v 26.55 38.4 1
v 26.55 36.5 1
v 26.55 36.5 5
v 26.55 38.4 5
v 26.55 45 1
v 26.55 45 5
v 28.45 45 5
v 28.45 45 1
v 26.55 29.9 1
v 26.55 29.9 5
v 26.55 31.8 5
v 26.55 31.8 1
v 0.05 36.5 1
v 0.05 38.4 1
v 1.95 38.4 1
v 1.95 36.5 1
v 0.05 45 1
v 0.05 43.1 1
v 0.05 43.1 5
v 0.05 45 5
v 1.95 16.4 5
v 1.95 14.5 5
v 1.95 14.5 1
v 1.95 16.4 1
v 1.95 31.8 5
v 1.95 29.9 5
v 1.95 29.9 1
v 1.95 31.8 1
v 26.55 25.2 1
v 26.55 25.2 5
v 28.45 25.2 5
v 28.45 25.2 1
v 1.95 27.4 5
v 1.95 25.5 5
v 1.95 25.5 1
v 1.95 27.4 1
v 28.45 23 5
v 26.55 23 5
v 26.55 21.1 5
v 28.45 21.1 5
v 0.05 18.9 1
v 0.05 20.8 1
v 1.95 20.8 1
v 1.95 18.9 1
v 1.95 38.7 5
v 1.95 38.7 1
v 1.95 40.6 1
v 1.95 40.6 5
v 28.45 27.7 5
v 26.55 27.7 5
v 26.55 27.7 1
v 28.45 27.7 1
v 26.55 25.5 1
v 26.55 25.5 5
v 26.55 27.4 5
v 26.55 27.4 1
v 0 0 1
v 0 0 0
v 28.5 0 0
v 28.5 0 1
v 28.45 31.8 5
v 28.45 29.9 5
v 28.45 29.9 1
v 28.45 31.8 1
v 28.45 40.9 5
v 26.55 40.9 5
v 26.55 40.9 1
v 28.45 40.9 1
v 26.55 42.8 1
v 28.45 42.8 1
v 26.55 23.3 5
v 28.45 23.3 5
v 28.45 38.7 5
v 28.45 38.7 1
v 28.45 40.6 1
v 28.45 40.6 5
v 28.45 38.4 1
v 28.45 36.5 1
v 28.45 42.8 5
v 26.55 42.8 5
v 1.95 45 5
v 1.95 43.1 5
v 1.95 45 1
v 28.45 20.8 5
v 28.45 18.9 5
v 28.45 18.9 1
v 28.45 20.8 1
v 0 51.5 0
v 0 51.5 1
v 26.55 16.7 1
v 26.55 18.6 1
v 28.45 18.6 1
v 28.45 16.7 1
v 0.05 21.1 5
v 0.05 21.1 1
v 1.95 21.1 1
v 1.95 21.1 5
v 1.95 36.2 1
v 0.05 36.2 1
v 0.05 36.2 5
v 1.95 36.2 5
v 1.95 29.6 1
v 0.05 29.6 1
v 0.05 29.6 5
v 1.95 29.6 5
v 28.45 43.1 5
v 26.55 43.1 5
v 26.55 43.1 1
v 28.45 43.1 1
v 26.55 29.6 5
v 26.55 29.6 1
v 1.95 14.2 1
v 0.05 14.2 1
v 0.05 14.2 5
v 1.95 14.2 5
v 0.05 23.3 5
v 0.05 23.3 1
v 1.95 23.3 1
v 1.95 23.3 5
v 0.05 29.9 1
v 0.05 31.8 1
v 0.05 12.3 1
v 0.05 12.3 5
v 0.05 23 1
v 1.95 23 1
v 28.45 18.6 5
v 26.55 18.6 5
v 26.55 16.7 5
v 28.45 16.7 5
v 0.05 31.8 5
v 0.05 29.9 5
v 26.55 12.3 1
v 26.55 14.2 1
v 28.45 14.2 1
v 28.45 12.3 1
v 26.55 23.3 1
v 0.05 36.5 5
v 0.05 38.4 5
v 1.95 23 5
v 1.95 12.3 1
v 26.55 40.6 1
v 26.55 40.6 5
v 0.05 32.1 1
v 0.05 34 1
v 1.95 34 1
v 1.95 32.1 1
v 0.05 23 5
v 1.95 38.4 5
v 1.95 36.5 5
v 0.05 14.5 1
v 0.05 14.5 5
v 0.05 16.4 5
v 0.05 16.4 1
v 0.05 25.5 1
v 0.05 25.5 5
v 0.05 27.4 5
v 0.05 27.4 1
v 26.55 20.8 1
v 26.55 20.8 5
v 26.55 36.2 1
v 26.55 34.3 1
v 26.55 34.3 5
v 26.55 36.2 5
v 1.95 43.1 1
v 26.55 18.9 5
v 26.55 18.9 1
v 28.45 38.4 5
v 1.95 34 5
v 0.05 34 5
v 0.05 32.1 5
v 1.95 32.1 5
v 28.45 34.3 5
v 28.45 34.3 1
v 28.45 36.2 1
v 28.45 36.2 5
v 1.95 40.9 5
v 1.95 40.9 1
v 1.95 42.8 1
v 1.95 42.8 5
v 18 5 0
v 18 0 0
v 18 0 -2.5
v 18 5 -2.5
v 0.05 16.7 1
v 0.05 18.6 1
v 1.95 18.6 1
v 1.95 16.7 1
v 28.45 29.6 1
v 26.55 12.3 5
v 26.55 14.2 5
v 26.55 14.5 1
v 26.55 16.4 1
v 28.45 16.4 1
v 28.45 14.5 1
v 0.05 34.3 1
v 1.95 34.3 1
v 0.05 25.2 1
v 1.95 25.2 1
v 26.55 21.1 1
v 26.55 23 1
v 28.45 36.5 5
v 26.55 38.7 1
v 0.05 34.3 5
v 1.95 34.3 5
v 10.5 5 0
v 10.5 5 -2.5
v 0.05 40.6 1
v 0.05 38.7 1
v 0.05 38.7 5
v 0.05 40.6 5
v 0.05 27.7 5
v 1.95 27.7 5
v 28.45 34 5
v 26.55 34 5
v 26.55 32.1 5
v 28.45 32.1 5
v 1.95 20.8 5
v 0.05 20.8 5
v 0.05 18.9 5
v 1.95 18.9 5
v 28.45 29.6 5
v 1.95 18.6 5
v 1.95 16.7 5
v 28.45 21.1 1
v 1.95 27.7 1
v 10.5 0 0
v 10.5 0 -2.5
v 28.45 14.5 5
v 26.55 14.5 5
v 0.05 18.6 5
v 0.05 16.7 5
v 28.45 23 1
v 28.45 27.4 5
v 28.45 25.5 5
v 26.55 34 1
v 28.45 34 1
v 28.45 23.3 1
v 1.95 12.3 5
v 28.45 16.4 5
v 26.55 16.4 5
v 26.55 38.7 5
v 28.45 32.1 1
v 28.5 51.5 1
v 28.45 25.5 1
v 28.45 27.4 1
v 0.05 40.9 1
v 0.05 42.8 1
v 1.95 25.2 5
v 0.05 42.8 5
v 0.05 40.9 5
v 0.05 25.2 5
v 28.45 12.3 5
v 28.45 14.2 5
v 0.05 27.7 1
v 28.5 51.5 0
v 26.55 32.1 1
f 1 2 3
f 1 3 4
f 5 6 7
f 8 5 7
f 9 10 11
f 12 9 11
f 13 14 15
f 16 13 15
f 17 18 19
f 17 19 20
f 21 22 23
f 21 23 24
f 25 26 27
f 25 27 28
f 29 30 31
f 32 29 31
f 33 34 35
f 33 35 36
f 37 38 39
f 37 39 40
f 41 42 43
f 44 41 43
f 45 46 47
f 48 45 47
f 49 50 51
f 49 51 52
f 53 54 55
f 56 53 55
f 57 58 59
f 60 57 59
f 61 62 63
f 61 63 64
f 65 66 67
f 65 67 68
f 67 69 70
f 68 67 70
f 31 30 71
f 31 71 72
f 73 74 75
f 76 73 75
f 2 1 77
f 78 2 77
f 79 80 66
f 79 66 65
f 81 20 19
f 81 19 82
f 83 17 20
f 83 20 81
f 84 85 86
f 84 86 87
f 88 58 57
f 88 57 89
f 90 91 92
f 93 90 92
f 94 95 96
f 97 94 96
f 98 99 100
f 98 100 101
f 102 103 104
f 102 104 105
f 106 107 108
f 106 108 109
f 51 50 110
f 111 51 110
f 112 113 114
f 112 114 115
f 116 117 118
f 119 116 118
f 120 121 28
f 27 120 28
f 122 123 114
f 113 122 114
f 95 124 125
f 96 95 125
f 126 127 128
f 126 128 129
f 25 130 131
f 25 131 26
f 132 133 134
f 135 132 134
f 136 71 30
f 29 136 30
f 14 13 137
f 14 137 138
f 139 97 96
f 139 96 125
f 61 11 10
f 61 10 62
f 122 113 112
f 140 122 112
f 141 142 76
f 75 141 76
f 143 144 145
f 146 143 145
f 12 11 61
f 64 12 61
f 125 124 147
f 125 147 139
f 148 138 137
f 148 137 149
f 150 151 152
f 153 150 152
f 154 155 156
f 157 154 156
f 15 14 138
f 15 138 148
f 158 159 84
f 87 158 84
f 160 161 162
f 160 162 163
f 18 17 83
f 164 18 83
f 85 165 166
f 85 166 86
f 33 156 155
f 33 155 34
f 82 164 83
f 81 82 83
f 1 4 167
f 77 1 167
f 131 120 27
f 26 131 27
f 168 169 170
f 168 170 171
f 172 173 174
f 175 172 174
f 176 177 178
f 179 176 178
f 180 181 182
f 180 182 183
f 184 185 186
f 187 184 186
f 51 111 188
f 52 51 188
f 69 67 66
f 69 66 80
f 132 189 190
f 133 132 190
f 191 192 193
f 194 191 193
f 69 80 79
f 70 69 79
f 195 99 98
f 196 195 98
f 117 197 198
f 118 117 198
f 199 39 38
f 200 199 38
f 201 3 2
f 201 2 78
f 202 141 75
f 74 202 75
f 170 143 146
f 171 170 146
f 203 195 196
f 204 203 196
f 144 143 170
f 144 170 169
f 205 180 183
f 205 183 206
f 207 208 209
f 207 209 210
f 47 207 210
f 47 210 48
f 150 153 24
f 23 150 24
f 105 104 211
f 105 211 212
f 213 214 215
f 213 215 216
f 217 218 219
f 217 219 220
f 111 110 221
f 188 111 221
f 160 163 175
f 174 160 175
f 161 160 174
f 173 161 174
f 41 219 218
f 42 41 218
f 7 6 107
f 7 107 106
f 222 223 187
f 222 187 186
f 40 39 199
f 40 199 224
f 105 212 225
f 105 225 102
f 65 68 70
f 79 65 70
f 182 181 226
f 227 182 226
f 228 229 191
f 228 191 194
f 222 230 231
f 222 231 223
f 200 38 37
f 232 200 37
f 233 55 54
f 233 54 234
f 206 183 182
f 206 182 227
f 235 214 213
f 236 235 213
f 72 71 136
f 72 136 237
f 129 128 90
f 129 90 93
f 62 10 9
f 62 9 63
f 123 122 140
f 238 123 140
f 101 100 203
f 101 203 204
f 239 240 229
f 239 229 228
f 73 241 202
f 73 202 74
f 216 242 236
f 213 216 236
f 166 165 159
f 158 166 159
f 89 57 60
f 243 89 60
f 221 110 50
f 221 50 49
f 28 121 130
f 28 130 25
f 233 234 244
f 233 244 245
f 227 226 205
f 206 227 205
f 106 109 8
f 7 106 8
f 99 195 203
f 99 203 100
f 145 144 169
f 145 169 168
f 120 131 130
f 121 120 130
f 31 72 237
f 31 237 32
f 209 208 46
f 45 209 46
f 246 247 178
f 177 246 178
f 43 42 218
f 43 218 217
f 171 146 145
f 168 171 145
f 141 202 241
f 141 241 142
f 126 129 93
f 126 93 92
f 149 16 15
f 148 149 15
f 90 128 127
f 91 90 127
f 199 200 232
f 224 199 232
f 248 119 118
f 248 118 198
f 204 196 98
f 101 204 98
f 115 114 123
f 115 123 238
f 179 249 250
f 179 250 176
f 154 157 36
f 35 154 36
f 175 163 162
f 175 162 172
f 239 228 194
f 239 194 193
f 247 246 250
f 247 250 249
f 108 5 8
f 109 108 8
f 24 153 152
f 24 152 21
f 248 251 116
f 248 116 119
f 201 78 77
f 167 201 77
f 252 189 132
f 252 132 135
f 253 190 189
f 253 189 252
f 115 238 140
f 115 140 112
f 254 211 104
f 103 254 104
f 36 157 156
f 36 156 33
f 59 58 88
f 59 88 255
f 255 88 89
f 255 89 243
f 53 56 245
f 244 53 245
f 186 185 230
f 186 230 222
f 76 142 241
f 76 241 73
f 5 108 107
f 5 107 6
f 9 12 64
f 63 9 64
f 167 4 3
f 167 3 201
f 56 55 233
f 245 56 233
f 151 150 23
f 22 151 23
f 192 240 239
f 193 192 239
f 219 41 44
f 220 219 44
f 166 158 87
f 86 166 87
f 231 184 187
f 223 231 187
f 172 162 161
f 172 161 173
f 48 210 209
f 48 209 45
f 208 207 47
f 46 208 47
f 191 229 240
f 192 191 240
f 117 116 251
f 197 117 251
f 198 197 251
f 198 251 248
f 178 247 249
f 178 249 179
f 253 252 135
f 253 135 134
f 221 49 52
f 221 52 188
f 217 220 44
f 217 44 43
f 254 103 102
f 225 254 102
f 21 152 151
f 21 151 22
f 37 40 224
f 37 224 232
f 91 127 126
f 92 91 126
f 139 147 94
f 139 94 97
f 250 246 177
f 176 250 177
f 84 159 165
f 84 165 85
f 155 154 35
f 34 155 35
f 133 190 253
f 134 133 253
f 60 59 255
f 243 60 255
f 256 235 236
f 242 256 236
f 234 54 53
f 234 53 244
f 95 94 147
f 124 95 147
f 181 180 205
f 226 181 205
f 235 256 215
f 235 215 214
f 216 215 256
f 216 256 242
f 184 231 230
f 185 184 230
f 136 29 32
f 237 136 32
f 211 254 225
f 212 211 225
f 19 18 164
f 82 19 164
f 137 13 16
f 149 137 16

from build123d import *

# Parameters (mm, degrees)
SKETCH_1_W         = 28.5
SKETCH_1_H         = 51.5
EXTRUDE_1_DEPTH    = 1
SKETCH_2_W         = 1.9
SKETCH_2_H         = 1.9
EXTRUDE_2_DEPTH    = 4
EXTRUDE_2_2_DEPTH  = 4
EXTRUDE_2_3_DEPTH  = 4
EXTRUDE_2_4_DEPTH  = 4
EXTRUDE_2_5_DEPTH  = 4
EXTRUDE_2_6_DEPTH  = 4
EXTRUDE_2_7_DEPTH  = 4
EXTRUDE_2_8_DEPTH  = 4
EXTRUDE_2_9_DEPTH  = 4
EXTRUDE_2_10_DEPTH = 4
EXTRUDE_2_11_DEPTH = 4
EXTRUDE_2_12_DEPTH = 4
EXTRUDE_2_13_DEPTH = 4
EXTRUDE_2_14_DEPTH = 4
EXTRUDE_2_15_DEPTH = 4
EXTRUDE_2_16_DEPTH = 4
EXTRUDE_2_17_DEPTH = 4
EXTRUDE_2_18_DEPTH = 4
EXTRUDE_2_19_DEPTH = 4
EXTRUDE_2_20_DEPTH = 4
EXTRUDE_2_21_DEPTH = 4
EXTRUDE_2_22_DEPTH = 4
EXTRUDE_2_23_DEPTH = 4
EXTRUDE_2_24_DEPTH = 4
EXTRUDE_2_25_DEPTH = 4
EXTRUDE_2_26_DEPTH = 4
EXTRUDE_2_27_DEPTH = 4
EXTRUDE_2_28_DEPTH = 4
EXTRUDE_2_29_DEPTH = 4
EXTRUDE_2_30_DEPTH = 4
SKETCH_3_W         = 7.5
SKETCH_3_H         = 5
EXTRUDE_3_DEPTH    = 2.5


with BuildPart() as part:
    # ｽｹｯﾁ1 → ﾎﾞｽ - 押し出し1 (new body)
    with BuildSketch(Plane.XY):
        with Locations((14.25, 25.75)):
            Rectangle(SKETCH_1_W, SKETCH_1_H)
    extrude(amount=EXTRUDE_1_DEPTH)


with BuildPart() as body_2:
    # ｽｹｯﾁ2 → ﾎﾞｽ - 押し出し2 (new body)
    with BuildSketch(Plane.XY.offset(1)):
        with Locations((1, 44.05)):
            Rectangle(SKETCH_2_W, SKETCH_2_H)
    extrude(amount=EXTRUDE_2_DEPTH)


with BuildPart() as body_3:
    # ｽｹｯﾁ2 → Extrude 2 2 (new body)
    with BuildSketch(Plane.XY.offset(1)):
        with Locations((27.5, 44.05)):
            Rectangle(SKETCH_2_W, SKETCH_2_H)
    extrude(amount=EXTRUDE_2_2_DEPTH)


with BuildPart() as body_4:
    # ｽｹｯﾁ2 → Extrude 2 3 (new body)
    with BuildSketch(Plane.XY.offset(1)):
        with Locations((1, 41.85)):
            Rectangle(SKETCH_2_W, SKETCH_2_H)
    extrude(amount=EXTRUDE_2_3_DEPTH)


with BuildPart() as body_5:
    # ｽｹｯﾁ2 → Extrude 2 4 (new body)
    with BuildSketch(Plane.XY.offset(1)):
        with Locations((27.5, 41.85)):
            Rectangle(SKETCH_2_W, SKETCH_2_H)
    extrude(amount=EXTRUDE_2_4_DEPTH)


with BuildPart() as body_6:
    # ｽｹｯﾁ2 → Extrude 2 5 (new body)
    with BuildSketch(Plane.XY.offset(1)):
        with Locations((1, 39.65)):
            Rectangle(SKETCH_2_W, SKETCH_2_H)
    extrude(amount=EXTRUDE_2_5_DEPTH)


with BuildPart() as body_7:
    # ｽｹｯﾁ2 → Extrude 2 6 (new body)
    with BuildSketch(Plane.XY.offset(1)):
        with Locations((27.5, 39.65)):
            Rectangle(SKETCH_2_W, SKETCH_2_H)
    extrude(amount=EXTRUDE_2_6_DEPTH)


with BuildPart() as body_8:
    # ｽｹｯﾁ2 → Extrude 2 7 (new body)
    with BuildSketch(Plane.XY.offset(1)):
        with Locations((1, 37.45)):
            Rectangle(SKETCH_2_W, SKETCH_2_H)
    extrude(amount=EXTRUDE_2_7_DEPTH)


with BuildPart() as body_9:
    # ｽｹｯﾁ2 → Extrude 2 8 (new body)
    with BuildSketch(Plane.XY.offset(1)):
        with Locations((27.5, 37.45)):
            Rectangle(SKETCH_2_W, SKETCH_2_H)
    extrude(amount=EXTRUDE_2_8_DEPTH)


with BuildPart() as body_10:
    # ｽｹｯﾁ2 → Extrude 2 9 (new body)
    with BuildSketch(Plane.XY.offset(1)):
        with Locations((1, 35.25)):
            Rectangle(SKETCH_2_W, SKETCH_2_H)
    extrude(amount=EXTRUDE_2_9_DEPTH)


with BuildPart() as body_11:
    # ｽｹｯﾁ2 → Extrude 2 10 (new body)
    with BuildSketch(Plane.XY.offset(1)):
        with Locations((27.5, 35.25)):
            Rectangle(SKETCH_2_W, SKETCH_2_H)
    extrude(amount=EXTRUDE_2_10_DEPTH)


with BuildPart() as body_12:
    # ｽｹｯﾁ2 → Extrude 2 11 (new body)
    with BuildSketch(Plane.XY.offset(1)):
        with Locations((1, 33.05)):
            Rectangle(SKETCH_2_W, SKETCH_2_H)
    extrude(amount=EXTRUDE_2_11_DEPTH)


with BuildPart() as body_13:
    # ｽｹｯﾁ2 → Extrude 2 12 (new body)
    with BuildSketch(Plane.XY.offset(1)):
        with Locations((27.5, 33.05)):
            Rectangle(SKETCH_2_W, SKETCH_2_H)
    extrude(amount=EXTRUDE_2_12_DEPTH)


with BuildPart() as body_14:
    # ｽｹｯﾁ2 → Extrude 2 13 (new body)
    with BuildSketch(Plane.XY.offset(1)):
        with Locations((1, 30.85)):
            Rectangle(SKETCH_2_W, SKETCH_2_H)
    extrude(amount=EXTRUDE_2_13_DEPTH)


with BuildPart() as body_15:
    # ｽｹｯﾁ2 → Extrude 2 14 (new body)
    with BuildSketch(Plane.XY.offset(1)):
        with Locations((27.5, 30.85)):
            Rectangle(SKETCH_2_W, SKETCH_2_H)
    extrude(amount=EXTRUDE_2_14_DEPTH)


with BuildPart() as body_16:
    # ｽｹｯﾁ2 → Extrude 2 15 (new body)
    with BuildSketch(Plane.XY.offset(1)):
        with Locations((1, 28.65)):
            Rectangle(SKETCH_2_W, SKETCH_2_H)
    extrude(amount=EXTRUDE_2_15_DEPTH)


with BuildPart() as body_17:
    # ｽｹｯﾁ2 → Extrude 2 16 (new body)
    with BuildSketch(Plane.XY.offset(1)):
        with Locations((27.5, 28.65)):
            Rectangle(SKETCH_2_W, SKETCH_2_H)
    extrude(amount=EXTRUDE_2_16_DEPTH)


with BuildPart() as body_18:
    # ｽｹｯﾁ2 → Extrude 2 17 (new body)
    with BuildSketch(Plane.XY.offset(1)):
        with Locations((1, 26.45)):
            Rectangle(SKETCH_2_W, SKETCH_2_H)
    extrude(amount=EXTRUDE_2_17_DEPTH)


with BuildPart() as body_19:
    # ｽｹｯﾁ2 → Extrude 2 18 (new body)
    with BuildSketch(Plane.XY.offset(1)):
        with Locations((27.5, 26.45)):
            Rectangle(SKETCH_2_W, SKETCH_2_H)
    extrude(amount=EXTRUDE_2_18_DEPTH)


with BuildPart() as body_20:
    # ｽｹｯﾁ2 → Extrude 2 19 (new body)
    with BuildSketch(Plane.XY.offset(1)):
        with Locations((1, 24.25)):
            Rectangle(SKETCH_2_W, SKETCH_2_H)
    extrude(amount=EXTRUDE_2_19_DEPTH)


with BuildPart() as body_21:
    # ｽｹｯﾁ2 → Extrude 2 20 (new body)
    with BuildSketch(Plane.XY.offset(1)):
        with Locations((27.5, 24.25)):
            Rectangle(SKETCH_2_W, SKETCH_2_H)
    extrude(amount=EXTRUDE_2_20_DEPTH)


with BuildPart() as body_22:
    # ｽｹｯﾁ2 → Extrude 2 21 (new body)
    with BuildSketch(Plane.XY.offset(1)):
        with Locations((1, 22.05)):
            Rectangle(SKETCH_2_W, SKETCH_2_H)
    extrude(amount=EXTRUDE_2_21_DEPTH)


with BuildPart() as body_23:
    # ｽｹｯﾁ2 → Extrude 2 22 (new body)
    with BuildSketch(Plane.XY.offset(1)):
        with Locations((27.5, 22.05)):
            Rectangle(SKETCH_2_W, SKETCH_2_H)
    extrude(amount=EXTRUDE_2_22_DEPTH)


with BuildPart() as body_24:
    # ｽｹｯﾁ2 → Extrude 2 23 (new body)
    with BuildSketch(Plane.XY.offset(1)):
        with Locations((1, 19.85)):
            Rectangle(SKETCH_2_W, SKETCH_2_H)
    extrude(amount=EXTRUDE_2_23_DEPTH)


with BuildPart() as body_25:
    # ｽｹｯﾁ2 → Extrude 2 24 (new body)
    with BuildSketch(Plane.XY.offset(1)):
        with Locations((27.5, 19.85)):
            Rectangle(SKETCH_2_W, SKETCH_2_H)
    extrude(amount=EXTRUDE_2_24_DEPTH)


with BuildPart() as body_26:
    # ｽｹｯﾁ2 → Extrude 2 25 (new body)
    with BuildSketch(Plane.XY.offset(1)):
        with Locations((1, 17.65)):
            Rectangle(SKETCH_2_W, SKETCH_2_H)
    extrude(amount=EXTRUDE_2_25_DEPTH)


with BuildPart() as body_27:
    # ｽｹｯﾁ2 → Extrude 2 26 (new body)
    with BuildSketch(Plane.XY.offset(1)):
        with Locations((27.5, 17.65)):
            Rectangle(SKETCH_2_W, SKETCH_2_H)
    extrude(amount=EXTRUDE_2_26_DEPTH)


with BuildPart() as body_28:
    # ｽｹｯﾁ2 → Extrude 2 27 (new body)
    with BuildSketch(Plane.XY.offset(1)):
        with Locations((1, 15.45)):
            Rectangle(SKETCH_2_W, SKETCH_2_H)
    extrude(amount=EXTRUDE_2_27_DEPTH)


with BuildPart() as body_29:
    # ｽｹｯﾁ2 → Extrude 2 28 (new body)
    with BuildSketch(Plane.XY.offset(1)):
        with Locations((27.5, 15.45)):
            Rectangle(SKETCH_2_W, SKETCH_2_H)
    extrude(amount=EXTRUDE_2_28_DEPTH)


with BuildPart() as body_30:
    # ｽｹｯﾁ2 → Extrude 2 29 (new body)
    with BuildSketch(Plane.XY.offset(1)):
        with Locations((1, 13.25)):
            Rectangle(SKETCH_2_W, SKETCH_2_H)
    extrude(amount=EXTRUDE_2_29_DEPTH)


with BuildPart() as body_31:
    # ｽｹｯﾁ2 → Extrude 2 30 (new body)
    with BuildSketch(Plane.XY.offset(1)):
        with Locations((27.5, 13.25)):
            Rectangle(SKETCH_2_W, SKETCH_2_H)
    extrude(amount=EXTRUDE_2_30_DEPTH)


with BuildPart() as body_32:
    # ｽｹｯﾁ3 → ﾎﾞｽ - 押し出し3 (new body)
    with BuildSketch(Plane(origin=(0, 0, 0), x_dir=(-1, 0, 0), z_dir=(0, 0, -1))):
        with Locations((-14.25, 2.5)):
            Rectangle(SKETCH_3_W, SKETCH_3_H)
    extrude(amount=EXTRUDE_3_DEPTH)


solid = Compound([part.part, body_2.part, body_3.part, body_4.part, body_5.part, body_6.part, body_7.part, body_8.part, body_9.part, body_10.part, body_11.part, body_12.part, body_13.part, body_14.part, body_15.part, body_16.part, body_17.part, body_18.part, body_19.part, body_20.part, body_21.part, body_22.part, body_23.part, body_24.part, body_25.part, body_26.part, body_27.part, body_28.part, body_29.part, body_30.part, body_31.part, body_32.part])
